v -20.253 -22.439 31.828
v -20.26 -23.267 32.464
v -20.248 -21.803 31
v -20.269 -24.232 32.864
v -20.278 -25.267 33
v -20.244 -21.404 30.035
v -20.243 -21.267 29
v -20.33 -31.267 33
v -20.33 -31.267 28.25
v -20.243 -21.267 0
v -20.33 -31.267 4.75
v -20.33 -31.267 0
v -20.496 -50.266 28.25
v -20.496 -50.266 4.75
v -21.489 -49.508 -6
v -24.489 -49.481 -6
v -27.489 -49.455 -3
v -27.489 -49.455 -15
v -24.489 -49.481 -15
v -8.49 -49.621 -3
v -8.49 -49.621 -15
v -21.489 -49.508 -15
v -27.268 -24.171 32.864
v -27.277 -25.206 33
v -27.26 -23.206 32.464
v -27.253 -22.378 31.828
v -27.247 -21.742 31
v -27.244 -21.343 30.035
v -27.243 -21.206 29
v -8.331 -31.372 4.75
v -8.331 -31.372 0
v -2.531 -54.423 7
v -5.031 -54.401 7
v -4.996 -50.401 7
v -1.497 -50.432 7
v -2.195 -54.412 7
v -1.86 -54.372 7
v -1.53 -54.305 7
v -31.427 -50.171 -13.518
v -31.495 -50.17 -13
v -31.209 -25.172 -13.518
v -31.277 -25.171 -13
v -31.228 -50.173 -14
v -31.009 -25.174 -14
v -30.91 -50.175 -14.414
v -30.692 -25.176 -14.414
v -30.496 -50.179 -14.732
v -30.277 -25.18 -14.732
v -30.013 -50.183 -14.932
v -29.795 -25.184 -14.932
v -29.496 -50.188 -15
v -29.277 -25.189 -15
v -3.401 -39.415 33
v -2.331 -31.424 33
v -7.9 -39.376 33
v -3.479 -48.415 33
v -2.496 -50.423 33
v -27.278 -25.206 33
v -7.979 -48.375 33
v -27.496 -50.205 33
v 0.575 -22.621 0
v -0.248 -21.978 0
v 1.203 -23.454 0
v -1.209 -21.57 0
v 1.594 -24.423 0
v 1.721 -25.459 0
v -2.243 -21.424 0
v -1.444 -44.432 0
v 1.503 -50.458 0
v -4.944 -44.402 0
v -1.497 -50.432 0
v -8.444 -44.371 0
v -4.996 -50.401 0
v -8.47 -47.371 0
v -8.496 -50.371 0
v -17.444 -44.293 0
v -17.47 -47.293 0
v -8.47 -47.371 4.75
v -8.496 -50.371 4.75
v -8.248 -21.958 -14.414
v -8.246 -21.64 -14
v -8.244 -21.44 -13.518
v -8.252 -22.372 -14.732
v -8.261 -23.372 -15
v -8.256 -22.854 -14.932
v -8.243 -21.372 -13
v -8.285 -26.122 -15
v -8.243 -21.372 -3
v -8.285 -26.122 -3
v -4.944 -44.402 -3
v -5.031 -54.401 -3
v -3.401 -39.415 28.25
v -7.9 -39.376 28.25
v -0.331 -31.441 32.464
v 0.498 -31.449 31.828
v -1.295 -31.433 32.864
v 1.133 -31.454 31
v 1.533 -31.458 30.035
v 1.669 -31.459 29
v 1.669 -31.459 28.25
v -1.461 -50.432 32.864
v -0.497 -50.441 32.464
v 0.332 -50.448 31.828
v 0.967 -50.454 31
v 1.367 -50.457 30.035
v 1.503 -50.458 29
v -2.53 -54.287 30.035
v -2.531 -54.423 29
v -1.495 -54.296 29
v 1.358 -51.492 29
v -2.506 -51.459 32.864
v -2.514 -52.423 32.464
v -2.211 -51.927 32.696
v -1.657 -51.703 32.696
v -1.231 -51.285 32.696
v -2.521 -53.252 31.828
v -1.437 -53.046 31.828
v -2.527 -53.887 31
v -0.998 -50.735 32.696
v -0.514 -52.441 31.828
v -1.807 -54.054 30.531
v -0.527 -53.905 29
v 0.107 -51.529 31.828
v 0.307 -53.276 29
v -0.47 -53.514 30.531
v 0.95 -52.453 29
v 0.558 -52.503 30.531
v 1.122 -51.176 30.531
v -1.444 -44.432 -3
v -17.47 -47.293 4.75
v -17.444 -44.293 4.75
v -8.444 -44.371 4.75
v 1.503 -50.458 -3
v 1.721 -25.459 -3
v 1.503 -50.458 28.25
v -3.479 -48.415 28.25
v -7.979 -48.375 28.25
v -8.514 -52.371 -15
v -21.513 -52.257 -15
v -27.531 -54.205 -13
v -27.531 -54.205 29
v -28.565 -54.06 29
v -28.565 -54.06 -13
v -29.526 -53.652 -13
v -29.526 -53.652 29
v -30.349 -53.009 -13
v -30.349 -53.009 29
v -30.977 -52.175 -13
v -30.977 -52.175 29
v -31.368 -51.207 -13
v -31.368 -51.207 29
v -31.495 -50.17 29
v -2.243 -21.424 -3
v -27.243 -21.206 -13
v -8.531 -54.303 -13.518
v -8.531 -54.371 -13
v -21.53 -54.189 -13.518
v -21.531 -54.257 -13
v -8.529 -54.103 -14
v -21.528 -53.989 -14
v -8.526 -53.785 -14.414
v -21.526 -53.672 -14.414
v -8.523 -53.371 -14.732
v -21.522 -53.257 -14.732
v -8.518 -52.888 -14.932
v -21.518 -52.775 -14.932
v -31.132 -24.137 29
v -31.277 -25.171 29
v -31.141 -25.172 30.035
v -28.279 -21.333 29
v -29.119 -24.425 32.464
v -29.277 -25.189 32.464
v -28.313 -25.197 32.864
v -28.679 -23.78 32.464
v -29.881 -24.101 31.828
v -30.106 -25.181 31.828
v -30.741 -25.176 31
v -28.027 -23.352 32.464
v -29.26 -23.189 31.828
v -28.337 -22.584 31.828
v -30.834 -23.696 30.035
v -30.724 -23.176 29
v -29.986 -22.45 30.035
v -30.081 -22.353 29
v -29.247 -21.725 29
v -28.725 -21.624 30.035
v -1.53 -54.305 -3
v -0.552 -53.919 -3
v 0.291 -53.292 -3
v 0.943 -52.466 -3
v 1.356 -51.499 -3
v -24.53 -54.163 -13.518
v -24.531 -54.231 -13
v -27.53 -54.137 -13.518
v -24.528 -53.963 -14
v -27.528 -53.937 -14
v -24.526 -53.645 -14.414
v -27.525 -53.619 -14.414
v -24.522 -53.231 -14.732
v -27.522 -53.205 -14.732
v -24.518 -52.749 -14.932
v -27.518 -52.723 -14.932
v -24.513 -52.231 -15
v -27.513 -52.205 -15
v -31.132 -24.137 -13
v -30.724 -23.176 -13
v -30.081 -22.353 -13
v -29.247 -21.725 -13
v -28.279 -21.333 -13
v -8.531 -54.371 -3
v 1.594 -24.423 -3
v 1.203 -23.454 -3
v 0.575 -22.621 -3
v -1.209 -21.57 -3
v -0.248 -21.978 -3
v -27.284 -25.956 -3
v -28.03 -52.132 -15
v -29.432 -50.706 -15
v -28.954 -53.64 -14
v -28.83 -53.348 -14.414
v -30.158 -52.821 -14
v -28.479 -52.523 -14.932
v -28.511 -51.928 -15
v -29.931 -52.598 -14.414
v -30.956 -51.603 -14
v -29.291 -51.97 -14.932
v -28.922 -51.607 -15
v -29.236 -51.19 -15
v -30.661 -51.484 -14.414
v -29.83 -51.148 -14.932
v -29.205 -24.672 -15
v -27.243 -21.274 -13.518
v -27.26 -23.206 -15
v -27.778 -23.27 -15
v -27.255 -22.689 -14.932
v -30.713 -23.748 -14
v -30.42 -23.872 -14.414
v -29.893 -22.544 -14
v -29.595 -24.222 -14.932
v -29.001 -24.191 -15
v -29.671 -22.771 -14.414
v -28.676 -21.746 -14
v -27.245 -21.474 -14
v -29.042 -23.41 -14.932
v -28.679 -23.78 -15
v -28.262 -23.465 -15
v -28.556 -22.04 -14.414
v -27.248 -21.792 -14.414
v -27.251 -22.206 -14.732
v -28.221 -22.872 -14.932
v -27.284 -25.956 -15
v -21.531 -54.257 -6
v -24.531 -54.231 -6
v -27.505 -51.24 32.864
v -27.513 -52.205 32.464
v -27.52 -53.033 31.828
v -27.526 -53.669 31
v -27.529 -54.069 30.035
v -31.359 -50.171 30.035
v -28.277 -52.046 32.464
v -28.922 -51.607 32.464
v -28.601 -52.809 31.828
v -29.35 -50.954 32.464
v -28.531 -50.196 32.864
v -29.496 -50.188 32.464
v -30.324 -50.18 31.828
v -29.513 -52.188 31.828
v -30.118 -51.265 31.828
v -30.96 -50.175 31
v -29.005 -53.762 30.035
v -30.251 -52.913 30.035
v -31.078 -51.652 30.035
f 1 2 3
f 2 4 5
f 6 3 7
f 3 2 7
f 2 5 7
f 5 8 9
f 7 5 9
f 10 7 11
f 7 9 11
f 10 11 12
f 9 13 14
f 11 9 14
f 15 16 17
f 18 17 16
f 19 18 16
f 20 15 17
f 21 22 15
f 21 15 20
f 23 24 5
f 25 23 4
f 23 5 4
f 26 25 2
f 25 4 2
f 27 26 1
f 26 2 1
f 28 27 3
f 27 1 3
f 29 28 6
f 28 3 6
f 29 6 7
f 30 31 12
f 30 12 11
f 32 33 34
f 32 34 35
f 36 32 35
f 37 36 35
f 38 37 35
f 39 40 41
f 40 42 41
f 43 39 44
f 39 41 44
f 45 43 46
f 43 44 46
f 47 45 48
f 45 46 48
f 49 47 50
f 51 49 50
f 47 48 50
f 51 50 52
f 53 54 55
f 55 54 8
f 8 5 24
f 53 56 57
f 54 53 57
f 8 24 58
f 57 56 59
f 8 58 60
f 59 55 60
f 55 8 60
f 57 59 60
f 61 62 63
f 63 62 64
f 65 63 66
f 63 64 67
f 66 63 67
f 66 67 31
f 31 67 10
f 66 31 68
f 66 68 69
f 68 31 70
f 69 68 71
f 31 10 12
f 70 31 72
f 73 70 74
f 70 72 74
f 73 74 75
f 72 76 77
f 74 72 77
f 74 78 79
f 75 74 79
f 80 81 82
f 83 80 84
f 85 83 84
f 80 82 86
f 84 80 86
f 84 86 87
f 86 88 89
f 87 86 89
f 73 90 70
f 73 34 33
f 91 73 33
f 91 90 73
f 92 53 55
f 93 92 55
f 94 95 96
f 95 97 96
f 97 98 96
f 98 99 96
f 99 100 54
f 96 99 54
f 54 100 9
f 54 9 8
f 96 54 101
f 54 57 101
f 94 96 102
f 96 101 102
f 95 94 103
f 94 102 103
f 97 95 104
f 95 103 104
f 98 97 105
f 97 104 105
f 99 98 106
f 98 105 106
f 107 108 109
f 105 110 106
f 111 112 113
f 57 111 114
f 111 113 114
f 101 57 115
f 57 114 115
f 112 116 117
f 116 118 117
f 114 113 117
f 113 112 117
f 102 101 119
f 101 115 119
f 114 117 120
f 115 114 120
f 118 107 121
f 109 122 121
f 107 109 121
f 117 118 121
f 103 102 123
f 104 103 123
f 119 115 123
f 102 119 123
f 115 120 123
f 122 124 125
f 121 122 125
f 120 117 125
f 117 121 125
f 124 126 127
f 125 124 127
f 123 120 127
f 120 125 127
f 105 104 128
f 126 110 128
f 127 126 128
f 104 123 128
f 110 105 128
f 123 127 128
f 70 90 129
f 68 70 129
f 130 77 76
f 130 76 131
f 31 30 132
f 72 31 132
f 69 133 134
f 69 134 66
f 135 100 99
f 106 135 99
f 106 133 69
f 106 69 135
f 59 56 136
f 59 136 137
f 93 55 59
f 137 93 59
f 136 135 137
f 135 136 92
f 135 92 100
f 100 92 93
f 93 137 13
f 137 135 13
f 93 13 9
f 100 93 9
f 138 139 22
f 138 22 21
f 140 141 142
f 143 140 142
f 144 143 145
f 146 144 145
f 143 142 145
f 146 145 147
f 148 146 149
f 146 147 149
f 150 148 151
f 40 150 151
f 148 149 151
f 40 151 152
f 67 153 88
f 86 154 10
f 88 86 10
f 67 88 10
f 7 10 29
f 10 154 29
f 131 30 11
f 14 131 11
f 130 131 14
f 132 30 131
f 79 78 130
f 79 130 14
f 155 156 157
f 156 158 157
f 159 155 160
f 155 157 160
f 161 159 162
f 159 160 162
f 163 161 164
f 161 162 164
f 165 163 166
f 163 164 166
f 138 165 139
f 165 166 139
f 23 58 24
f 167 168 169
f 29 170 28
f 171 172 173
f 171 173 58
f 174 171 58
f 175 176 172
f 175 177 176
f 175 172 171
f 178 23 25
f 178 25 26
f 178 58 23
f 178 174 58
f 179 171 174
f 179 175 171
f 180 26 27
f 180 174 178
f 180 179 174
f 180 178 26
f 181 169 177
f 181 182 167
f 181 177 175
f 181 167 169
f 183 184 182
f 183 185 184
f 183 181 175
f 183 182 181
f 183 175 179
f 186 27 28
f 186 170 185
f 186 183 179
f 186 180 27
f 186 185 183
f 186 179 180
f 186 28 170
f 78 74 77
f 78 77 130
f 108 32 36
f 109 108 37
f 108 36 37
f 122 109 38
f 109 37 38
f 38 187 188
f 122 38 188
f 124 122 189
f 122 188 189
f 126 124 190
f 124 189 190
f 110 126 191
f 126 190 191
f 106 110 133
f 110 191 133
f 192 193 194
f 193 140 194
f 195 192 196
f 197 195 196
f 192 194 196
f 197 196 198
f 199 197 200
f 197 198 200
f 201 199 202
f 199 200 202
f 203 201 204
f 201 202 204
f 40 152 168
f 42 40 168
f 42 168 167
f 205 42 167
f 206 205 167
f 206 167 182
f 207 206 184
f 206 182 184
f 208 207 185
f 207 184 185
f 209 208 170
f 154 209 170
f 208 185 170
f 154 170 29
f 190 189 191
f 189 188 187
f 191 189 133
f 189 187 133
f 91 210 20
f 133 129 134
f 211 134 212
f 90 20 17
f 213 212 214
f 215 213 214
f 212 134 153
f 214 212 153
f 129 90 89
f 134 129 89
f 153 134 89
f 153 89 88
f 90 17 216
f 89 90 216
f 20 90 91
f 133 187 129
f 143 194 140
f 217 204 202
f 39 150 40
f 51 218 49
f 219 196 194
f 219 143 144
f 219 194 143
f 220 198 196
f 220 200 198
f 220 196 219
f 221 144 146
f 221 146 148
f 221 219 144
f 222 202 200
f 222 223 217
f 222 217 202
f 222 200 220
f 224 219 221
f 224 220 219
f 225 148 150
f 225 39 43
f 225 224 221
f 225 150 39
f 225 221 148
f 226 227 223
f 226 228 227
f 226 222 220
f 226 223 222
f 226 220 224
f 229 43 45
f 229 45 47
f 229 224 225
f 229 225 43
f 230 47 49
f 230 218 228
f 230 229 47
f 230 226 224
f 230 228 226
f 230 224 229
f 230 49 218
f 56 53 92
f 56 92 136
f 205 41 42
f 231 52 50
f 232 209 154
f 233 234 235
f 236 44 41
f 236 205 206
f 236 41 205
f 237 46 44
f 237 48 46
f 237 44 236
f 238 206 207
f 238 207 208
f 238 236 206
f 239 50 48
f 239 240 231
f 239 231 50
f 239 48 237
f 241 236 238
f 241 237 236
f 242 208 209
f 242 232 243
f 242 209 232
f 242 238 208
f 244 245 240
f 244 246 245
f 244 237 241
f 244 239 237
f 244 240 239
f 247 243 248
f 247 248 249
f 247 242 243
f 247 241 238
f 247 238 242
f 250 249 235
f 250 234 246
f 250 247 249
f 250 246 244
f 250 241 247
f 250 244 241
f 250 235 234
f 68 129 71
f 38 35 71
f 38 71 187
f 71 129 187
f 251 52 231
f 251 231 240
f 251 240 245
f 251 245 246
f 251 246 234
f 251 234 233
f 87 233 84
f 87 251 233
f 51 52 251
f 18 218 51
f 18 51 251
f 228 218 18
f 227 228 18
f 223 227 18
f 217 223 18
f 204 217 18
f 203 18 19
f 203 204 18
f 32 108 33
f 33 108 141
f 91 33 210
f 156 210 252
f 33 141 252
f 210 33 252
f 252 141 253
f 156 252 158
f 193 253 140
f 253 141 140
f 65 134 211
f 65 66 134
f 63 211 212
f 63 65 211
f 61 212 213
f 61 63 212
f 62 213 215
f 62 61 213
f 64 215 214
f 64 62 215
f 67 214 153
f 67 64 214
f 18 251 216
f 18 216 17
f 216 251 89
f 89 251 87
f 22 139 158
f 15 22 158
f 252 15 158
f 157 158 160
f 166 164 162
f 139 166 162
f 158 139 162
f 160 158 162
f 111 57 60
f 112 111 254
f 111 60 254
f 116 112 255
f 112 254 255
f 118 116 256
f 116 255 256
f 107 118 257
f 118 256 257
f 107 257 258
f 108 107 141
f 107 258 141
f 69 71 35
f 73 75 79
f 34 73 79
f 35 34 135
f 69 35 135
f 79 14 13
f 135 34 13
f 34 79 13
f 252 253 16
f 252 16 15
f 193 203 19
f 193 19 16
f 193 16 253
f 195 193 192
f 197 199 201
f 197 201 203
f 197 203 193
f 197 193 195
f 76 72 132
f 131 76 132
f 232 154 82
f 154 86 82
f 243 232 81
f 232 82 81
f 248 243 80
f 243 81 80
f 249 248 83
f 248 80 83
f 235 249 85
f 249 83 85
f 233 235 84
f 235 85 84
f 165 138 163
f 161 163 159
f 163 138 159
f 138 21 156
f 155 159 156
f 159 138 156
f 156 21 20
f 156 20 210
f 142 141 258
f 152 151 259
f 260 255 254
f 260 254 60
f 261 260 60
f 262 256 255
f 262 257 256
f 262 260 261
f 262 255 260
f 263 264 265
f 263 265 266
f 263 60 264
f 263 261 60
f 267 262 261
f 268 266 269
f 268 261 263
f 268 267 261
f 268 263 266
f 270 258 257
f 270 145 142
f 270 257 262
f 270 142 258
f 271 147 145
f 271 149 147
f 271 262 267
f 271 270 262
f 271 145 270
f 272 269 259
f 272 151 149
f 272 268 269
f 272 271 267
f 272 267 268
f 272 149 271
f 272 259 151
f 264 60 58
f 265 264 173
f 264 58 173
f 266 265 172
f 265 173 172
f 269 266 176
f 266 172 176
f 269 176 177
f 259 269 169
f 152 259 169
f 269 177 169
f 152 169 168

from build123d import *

# Parameters (mm, degrees)
BOSS_EXTRU_1_DEPTH           = 15
ESQUISSE2_W                  = 19
ESQUISSE2_H                  = 23.5
ENL_V_MAT_EXTRU_1_DEPTH      = 12
ESQUISSE6_W                  = 3
ESQUISSE6_H                  = 4.75
ENL_V_MAT_EXTRU_3_DEPTH      = 9
BOSS_EXTRU_2_START           = 33
BOSS_EXTRU_2_DEPTH           = 33
ENL_V_MAT_EXTRU_2_DEPTH      = 12
ESQUISSE7_W                  = 4.75
ESQUISSE7_H                  = 3
ENL_V_MAT_EXTRU_4_DEPTH      = 9
BOSS_EXTRU_3_DEPTH           = 10
ESQUISSE10_W                 = 4.5
ESQUISSE10_H                 = 9
ENL_V_MAT_EXTRU_5_DEPTH      = 10
ESQUISSE11_W                 = 3.5
ESQUISSE11_H                 = 10
ENL_V_MAT_EXTRU_6_DEPTH      = 10
CONG_2_R                     = 2
CONG_3_R                     = 4
CORPS_D_PLACER_COPIER1_ANGLE = 179.5


with BuildPart() as part:
    # Esquisse1 → Boss.-Extru.1 (new body)
    with BuildSketch(Plane(origin=(-30.750548051, -23.495381217, 0), x_dir=(-1, 0, 0), z_dir=(0, 0, -1))):
        with BuildLine():
            Line((-9.363526751, -30.819304804), (-9.363526751, 2.180695196))
            Line((-9.363526751, 2.180695196), (-28.363526751, 2.180695196))
            ThreePointArc((-28.363526751, 2.180695196), (-31.191953876, 1.009122321), (-32.363526751, -1.819304804))
            Line((-32.363526751, -1.819304804), (-32.363526751, -26.819304804))
            ThreePointArc((-32.363526751, -26.819304804), (-31.191953876, -29.647731929), (-28.363526751, -30.819304804))
            Line((-28.363526751, -30.819304804), (-9.363526751, -30.819304804))
        make_face()
    extrude(amount=BOSS_EXTRU_1_DEPTH)

    # Esquisse2 → Enlèv. mat.-Extru.1 (cut)
    with BuildSketch(Plane(origin=(0, 0, -15), x_dir=(-1, 0, 0), z_dir=(0, 0, -1))):
        with Locations((11.8870213, -37.814686021)):
            Rectangle(ESQUISSE2_W, ESQUISSE2_H)
    extrude(amount=-ENL_V_MAT_EXTRU_1_DEPTH, mode=Mode.SUBTRACT)

    # Esquisse6 → Enlèv. mat.-Extru.3 (cut)
    with BuildSketch(Plane(origin=(0, 0, -15), x_dir=(-1, 0, 0), z_dir=(0, 0, -1))):
        with Locations((6.8870213, -23.689686021)):
            Rectangle(ESQUISSE6_W, ESQUISSE6_H)
    extrude(amount=-ENL_V_MAT_EXTRU_3_DEPTH, mode=Mode.SUBTRACT)

    # Esquisse4 → Boss.-Extru.2 (add)
    with BuildSketch(Plane.XY.offset(BOSS_EXTRU_2_START)):
        with BuildLine():
            Line((-21.3870213, -54.314686021), (-21.3870213, -21.314686021))
            Line((-21.3870213, -21.314686021), (-2.3870213, -21.314686021))
            ThreePointArc((-2.3870213, -21.314686021), (0.441405825, -22.486258896), (1.6129787, -25.314686021))
            Line((1.6129787, -25.314686021), (1.6129787, -50.314686021))
            ThreePointArc((1.6129787, -50.314686021), (0.441405825, -53.143113146), (-2.3870213, -54.314686021))
            Line((-2.3870213, -54.314686021), (-21.3870213, -54.314686021))
        make_face()
    extrude(amount=-BOSS_EXTRU_2_DEPTH)

    # Esquisse5 → Enlèv. mat.-Extru.2 (cut)
    with BuildSketch(Plane.ZY.offset(21.3870213)):
        Polygon((0, -44.314686021), (4.75, -44.314686021), (4.75, -25.314686021), (28.25, -25.314686021), (28.25, -44.314686021), (33, -44.314686021), (33, -54.314686021), (0, -54.314686021), align=None)
    extrude(amount=-ENL_V_MAT_EXTRU_2_DEPTH, mode=Mode.SUBTRACT)

    # Esquisse7 → Enlèv. mat.-Extru.4 (cut)
    with BuildSketch(Plane.ZY.offset(21.3870213)):
        with Locations((2.375, -29.814686021)):
            Rectangle(ESQUISSE7_W, ESQUISSE7_H)
    extrude(amount=-ENL_V_MAT_EXTRU_4_DEPTH, mode=Mode.SUBTRACT)

    # Esquisse9 → Boss.-Extru.3 (add)
    with BuildSketch(Plane.ZY.offset(21.3870213)):
        Polygon((28.25, -44.314686021), (33, -44.314686021), (33, -21.314686021), (-3, -21.314686021), (-3, -54.314686021), (0, -54.314686021), (0, -25.314686021), (28.25, -25.314686021), align=None)
    extrude(amount=BOSS_EXTRU_3_DEPTH)

    # Esquisse10 → Enlèv. mat.-Extru.5 (cut)
    with BuildSketch(Plane.XY.offset(33)):
        with Locations((-24.1370213, -31.814686021)):
            Rectangle(ESQUISSE10_W, ESQUISSE10_H)
    extrude(amount=-ENL_V_MAT_EXTRU_5_DEPTH, mode=Mode.SUBTRACT)

    # Esquisse11 → Enlèv. mat.-Extru.6 (cut)
    with BuildSketch(Plane(origin=(0, 0, -3), x_dir=(-1, 0, 0), z_dir=(0, 0, -1))):
        with Locations((26.6370213, -26.314686021)):
            Rectangle(ESQUISSE11_W, ESQUISSE11_H)
    extrude(amount=-ENL_V_MAT_EXTRU_6_DEPTH, mode=Mode.SUBTRACT)

    # Congé2
    cong_2_edges = [part.edges().sort_by_distance(p)[0] for p in [
        (-14.8870213, -21.314686021, -15),
        (0.441405825, -22.486258896, -15),
        (1.6129787, -37.814686021, -15),
        (0.441405825, -53.143113146, -15),
        (-3.8870213, -21.314686021, -15),
        (-11.8870213, -54.314686021, -15),
    ]]
    fillet(cong_2_edges, radius=CONG_2_R)

    # Congé3
    cong_3_edges = [part.edges().sort_by_distance(p)[0] for p in [
        (-31.3870213, -21.314686021, 15),
        (-31.3870213, -54.314686021, -1.5),
        (1.6129787, -37.814686021, 33),
        (-16.8870213, -21.314686021, 33),
        (-5.8870213, -54.314686021, 33),
        (-31.3870213, -32.814686021, 33),
        (0.441405825, -53.143113146, 33),
        (0.441405825, -22.486258896, 33),
    ]]
    fillet(cong_3_edges, radius=CONG_3_R - 0.0001)  # a hair under: the kernel refuses the full size


with BuildPart() as part_1:
    # Corps-Déplacer/Copier1: moved
    add(part.part.rotate(Axis((-14.8870213, -37.814686021, 0), (0, 0, 1)), CORPS_D_PLACER_COPIER1_ANGLE))


solid = part_1.part
